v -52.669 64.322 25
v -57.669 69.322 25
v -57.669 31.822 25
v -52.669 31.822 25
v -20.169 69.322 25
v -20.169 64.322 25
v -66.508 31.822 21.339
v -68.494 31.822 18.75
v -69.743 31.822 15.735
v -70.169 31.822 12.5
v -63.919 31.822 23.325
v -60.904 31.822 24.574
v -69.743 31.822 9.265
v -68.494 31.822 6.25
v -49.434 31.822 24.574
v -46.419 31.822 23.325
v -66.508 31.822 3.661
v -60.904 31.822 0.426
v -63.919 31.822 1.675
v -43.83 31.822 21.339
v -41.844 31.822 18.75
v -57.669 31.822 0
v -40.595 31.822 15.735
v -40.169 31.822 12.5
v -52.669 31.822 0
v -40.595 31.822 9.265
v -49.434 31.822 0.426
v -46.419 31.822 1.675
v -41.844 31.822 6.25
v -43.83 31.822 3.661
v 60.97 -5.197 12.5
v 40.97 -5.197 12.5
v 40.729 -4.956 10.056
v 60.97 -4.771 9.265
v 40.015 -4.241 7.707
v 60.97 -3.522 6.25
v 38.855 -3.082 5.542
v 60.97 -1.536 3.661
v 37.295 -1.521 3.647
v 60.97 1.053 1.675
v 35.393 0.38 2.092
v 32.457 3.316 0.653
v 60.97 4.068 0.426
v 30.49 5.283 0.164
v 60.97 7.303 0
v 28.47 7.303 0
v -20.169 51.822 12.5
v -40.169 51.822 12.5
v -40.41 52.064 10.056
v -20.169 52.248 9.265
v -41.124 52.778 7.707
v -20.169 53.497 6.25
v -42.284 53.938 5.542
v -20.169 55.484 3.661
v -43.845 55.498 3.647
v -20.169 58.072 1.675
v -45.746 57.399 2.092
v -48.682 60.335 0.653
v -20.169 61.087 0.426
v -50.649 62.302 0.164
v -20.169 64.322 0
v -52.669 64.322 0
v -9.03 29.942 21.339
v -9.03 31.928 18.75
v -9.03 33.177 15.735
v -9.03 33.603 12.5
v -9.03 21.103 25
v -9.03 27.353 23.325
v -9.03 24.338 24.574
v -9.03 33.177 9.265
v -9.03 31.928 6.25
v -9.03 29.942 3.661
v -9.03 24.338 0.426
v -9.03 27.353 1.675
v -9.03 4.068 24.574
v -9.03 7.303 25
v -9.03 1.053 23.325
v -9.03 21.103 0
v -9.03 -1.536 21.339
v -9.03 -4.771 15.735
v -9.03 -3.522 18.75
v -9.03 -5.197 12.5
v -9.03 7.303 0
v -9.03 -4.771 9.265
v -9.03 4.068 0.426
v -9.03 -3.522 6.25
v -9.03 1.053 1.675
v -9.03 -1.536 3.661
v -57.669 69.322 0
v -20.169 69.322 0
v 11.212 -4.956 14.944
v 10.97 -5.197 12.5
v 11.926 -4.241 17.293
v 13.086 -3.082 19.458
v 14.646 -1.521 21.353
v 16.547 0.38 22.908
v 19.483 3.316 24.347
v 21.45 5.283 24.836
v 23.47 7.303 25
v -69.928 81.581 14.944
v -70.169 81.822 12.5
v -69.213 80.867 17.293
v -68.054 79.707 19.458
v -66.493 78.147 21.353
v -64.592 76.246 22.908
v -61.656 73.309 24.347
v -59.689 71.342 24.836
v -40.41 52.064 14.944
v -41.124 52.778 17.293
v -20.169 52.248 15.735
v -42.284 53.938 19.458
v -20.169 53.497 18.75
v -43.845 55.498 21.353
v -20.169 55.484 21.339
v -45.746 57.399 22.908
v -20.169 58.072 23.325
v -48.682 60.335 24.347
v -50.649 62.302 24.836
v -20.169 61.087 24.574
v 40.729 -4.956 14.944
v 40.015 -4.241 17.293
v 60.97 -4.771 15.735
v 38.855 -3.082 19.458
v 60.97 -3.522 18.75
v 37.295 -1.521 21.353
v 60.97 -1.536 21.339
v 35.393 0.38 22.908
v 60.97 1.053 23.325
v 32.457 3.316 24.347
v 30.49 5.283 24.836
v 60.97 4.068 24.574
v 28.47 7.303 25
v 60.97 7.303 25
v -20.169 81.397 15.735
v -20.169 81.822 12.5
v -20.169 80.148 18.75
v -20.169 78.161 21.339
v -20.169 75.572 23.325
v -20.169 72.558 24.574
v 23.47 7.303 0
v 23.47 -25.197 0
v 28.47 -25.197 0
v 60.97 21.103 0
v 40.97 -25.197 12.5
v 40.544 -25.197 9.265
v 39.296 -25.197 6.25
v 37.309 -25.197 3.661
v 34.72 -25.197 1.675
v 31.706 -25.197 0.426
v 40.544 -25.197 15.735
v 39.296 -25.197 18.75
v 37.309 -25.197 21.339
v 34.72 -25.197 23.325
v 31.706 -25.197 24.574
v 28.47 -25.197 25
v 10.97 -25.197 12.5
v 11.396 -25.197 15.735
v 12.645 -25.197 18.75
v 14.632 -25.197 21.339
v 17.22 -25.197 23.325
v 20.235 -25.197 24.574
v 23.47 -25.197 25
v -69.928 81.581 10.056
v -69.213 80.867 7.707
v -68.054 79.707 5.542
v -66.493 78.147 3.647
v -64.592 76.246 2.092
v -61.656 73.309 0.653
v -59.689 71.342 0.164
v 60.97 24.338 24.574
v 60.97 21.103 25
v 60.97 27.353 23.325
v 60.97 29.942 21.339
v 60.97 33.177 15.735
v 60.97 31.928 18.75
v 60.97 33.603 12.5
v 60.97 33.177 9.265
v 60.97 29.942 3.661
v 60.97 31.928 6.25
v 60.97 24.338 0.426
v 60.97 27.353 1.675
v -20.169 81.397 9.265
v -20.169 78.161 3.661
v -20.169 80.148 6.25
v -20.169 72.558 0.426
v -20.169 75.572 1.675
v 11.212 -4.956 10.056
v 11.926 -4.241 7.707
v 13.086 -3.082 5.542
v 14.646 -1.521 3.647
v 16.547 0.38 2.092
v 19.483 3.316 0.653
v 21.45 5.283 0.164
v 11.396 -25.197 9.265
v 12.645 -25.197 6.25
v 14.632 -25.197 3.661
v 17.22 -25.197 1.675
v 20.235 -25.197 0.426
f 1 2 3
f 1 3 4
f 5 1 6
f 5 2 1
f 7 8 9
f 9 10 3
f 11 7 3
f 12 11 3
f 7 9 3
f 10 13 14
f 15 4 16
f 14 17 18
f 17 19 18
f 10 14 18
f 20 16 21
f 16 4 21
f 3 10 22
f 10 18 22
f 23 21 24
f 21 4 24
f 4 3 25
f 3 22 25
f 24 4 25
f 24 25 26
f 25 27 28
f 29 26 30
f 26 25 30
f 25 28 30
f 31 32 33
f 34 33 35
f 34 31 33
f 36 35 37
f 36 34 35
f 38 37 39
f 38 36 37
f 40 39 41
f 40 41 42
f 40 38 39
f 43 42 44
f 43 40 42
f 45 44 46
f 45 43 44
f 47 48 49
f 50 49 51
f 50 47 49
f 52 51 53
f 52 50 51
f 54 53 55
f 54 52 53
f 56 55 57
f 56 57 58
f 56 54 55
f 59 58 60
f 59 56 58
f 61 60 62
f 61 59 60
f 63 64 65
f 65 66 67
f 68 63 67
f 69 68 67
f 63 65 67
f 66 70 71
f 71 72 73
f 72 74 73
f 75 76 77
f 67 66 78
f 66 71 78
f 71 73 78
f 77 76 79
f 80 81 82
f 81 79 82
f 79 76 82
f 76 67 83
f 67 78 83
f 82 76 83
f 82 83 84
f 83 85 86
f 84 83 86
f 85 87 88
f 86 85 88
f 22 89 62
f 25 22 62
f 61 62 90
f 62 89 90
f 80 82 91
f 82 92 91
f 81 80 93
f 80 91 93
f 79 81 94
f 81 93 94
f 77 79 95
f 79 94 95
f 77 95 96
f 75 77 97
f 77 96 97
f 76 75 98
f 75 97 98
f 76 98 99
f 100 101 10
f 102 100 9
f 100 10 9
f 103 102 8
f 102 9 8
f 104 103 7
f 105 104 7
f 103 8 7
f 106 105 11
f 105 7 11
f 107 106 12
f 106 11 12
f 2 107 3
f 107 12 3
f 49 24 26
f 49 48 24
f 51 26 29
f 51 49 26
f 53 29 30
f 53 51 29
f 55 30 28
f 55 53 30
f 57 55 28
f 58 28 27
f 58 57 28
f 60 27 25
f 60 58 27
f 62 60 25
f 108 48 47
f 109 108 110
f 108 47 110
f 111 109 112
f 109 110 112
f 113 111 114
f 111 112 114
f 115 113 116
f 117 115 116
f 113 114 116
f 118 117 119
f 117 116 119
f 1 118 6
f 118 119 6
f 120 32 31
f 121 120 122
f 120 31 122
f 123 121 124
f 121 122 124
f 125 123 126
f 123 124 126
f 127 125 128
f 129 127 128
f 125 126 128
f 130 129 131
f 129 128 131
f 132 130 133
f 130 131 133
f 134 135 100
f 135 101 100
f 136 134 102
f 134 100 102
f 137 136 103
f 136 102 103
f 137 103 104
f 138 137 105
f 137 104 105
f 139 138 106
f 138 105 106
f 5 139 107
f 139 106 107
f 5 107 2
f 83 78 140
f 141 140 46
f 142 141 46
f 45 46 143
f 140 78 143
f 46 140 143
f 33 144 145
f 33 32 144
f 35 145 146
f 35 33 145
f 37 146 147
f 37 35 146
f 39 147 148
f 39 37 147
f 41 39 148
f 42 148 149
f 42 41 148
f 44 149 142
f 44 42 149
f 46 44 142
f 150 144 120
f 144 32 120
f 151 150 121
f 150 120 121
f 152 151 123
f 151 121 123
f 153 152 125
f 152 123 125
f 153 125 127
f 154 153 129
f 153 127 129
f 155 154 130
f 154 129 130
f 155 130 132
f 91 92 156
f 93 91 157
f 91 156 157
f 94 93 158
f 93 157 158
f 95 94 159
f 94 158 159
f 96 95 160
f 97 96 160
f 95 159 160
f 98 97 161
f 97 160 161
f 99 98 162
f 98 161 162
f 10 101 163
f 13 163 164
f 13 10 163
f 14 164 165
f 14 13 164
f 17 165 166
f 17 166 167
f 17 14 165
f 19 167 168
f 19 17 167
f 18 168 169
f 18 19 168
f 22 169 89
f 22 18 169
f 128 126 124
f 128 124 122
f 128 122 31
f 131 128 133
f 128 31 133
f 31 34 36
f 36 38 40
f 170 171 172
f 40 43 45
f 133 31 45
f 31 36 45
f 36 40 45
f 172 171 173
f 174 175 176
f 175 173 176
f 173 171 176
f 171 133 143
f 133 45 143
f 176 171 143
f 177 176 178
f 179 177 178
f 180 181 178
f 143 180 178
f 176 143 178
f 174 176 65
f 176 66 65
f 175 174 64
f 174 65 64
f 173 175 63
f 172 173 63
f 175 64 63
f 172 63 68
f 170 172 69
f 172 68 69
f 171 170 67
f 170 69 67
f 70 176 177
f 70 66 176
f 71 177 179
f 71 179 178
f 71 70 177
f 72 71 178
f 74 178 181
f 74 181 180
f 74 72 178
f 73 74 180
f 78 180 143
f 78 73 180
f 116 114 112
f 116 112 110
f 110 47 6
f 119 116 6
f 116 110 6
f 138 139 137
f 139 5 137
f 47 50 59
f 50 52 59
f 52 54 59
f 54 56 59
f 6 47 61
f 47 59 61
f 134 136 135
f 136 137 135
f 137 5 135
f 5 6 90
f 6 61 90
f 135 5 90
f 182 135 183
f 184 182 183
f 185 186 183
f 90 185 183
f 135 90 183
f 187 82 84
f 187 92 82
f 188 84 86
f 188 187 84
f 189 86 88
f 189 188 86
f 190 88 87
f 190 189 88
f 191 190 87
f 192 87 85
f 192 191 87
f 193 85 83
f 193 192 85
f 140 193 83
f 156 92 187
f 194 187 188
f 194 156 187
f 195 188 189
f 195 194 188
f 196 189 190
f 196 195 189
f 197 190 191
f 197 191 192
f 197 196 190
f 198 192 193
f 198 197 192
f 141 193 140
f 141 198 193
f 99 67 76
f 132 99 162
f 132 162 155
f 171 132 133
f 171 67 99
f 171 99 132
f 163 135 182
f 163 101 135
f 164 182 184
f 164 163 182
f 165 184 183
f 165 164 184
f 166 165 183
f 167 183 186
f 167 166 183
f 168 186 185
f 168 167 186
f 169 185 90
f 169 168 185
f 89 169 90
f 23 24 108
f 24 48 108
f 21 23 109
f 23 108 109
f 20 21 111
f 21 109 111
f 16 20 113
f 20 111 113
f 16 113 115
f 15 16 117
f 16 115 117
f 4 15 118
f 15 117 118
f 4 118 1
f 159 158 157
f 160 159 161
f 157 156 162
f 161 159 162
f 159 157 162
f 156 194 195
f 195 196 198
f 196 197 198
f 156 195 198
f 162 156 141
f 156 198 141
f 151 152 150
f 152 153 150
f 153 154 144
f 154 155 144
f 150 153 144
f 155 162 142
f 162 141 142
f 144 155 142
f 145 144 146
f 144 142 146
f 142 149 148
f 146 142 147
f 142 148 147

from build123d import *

# Parameters (mm, degrees)
F1_DEPTH = 25
F2_R     = 12.49999
F2_2_R   = 12.49999


# Not quite as in the source:
# - a fillet or chamfer is up to 0.001 mm smaller than in the source, because OpenCascade refuses the exact size


with BuildPart() as f1:
    # F0 (on Top) → F1 (new body)
    with BuildSketch(Plane.XY):
        Polygon((40.9703488648, -5.1968242228), (60.9703488648, -5.1968242228), (60.9703488648, 33.603176102), (25.9703488648, 33.603176102), (-9.0296511352, 33.603176102), (-9.0296511352, -5.1968242228), (10.9703488648, -5.1968242228), (10.9703488648, -25.1968242228), (25.9703488648, -25.1968242228), (40.9703488648, -25.1968242228), align=None)
        Polygon((35.9703488648, -20.1968242228), (25.9703488648, -20.1968242228), (15.9703488648, -20.1968242228), (15.9703488648, -0.1968242228), (-4.0296511352, -0.1968242228), (-4.0296511352, 28.603176102), (25.9703488648, 28.603176102), (55.9703488648, 28.603176102), (55.9703488648, -0.1968242228), (35.9703488648, -0.1968242228), align=None, mode=Mode.SUBTRACT)
        Polygon((15.9703488648, -20.1968242228), (25.9703488648, -20.1968242228), (25.9703488648, 28.603176102), (-4.0296511352, 28.603176102), (-4.0296511352, -0.1968242228), (15.9703488648, -0.1968242228), align=None)
        Polygon((25.9703488648, 28.603176102), (25.9703488648, -20.1968242228), (35.9703488648, -20.1968242228), (35.9703488648, -0.1968242228), (55.9703488648, -0.1968242228), (55.9703488648, 28.603176102), align=None)
    extrude(amount=F1_DEPTH)

    # F2#2 (radius 12.5 in the source; OpenCascade refuses exactly that, so slightly less here)
    f2_2_edges = [f1.edges().sort_by_distance(p)[0] for p in [
        (0.970349, -5.196824, 25),
        (10.970349, -15.196824, 25),
        (40.970349, -15.196824, 25),
        (50.970349, -5.196824, 25),
        (25.970349, 33.603176, 25),
        (50.970349, -5.196824, 0),
        (40.970349, -15.196824, 0),
        (10.970349, -15.196824, 0),
        (0.970349, -5.196824, 0),
        (25.970349, 33.603176, 0),
    ]]
    fillet(f2_2_edges, radius=F2_2_R)


with BuildPart() as f1b:
    # F0 (on Top) → F1, piece 2 (new body)
    with BuildSketch(Plane.XY):
        Polygon((-40.1689171791, 51.8224531412), (-20.1689171791, 51.8224531412), (-20.1689171791, 81.8224531412), (-70.1689171791, 81.8224531412), (-70.1689171791, 31.8224531412), (-40.1689171791, 31.8224531412), align=None)
        Polygon((-65.1689171791, 36.8224531412), (-65.1689171791, 76.8224531412), (-25.1689171791, 76.8224531412), (-25.1689171791, 56.8224531412), (-45.1689171791, 56.8224531412), (-45.1689171791, 36.8224531412), align=None, mode=Mode.SUBTRACT)
        Polygon((-25.1689171791, 76.8224531412), (-65.1689171791, 76.8224531412), (-65.1689171791, 36.8224531412), (-45.1689171791, 36.8224531412), (-45.1689171791, 56.8224531412), (-25.1689171791, 56.8224531412), align=None)
    extrude(amount=F1_DEPTH)

    # F2 (radius 12.5 in the source; OpenCascade refuses exactly that, so slightly less here)
    f2_edges = [f1b.edges().sort_by_distance(p)[0] for p in [
        (-45.168917, 81.822453, 25),
        (-70.168917, 56.822453, 25),
        (-40.168917, 41.822453, 25),
        (-30.168917, 51.822453, 25),
        (-70.168917, 56.822453, 0),
        (-45.168917, 81.822453, 0),
        (-30.168917, 51.822453, 0),
        (-40.168917, 41.822453, 0),
    ]]
    fillet(f2_edges, radius=F2_R)


solid = Compound([f1.part, f1b.part])
